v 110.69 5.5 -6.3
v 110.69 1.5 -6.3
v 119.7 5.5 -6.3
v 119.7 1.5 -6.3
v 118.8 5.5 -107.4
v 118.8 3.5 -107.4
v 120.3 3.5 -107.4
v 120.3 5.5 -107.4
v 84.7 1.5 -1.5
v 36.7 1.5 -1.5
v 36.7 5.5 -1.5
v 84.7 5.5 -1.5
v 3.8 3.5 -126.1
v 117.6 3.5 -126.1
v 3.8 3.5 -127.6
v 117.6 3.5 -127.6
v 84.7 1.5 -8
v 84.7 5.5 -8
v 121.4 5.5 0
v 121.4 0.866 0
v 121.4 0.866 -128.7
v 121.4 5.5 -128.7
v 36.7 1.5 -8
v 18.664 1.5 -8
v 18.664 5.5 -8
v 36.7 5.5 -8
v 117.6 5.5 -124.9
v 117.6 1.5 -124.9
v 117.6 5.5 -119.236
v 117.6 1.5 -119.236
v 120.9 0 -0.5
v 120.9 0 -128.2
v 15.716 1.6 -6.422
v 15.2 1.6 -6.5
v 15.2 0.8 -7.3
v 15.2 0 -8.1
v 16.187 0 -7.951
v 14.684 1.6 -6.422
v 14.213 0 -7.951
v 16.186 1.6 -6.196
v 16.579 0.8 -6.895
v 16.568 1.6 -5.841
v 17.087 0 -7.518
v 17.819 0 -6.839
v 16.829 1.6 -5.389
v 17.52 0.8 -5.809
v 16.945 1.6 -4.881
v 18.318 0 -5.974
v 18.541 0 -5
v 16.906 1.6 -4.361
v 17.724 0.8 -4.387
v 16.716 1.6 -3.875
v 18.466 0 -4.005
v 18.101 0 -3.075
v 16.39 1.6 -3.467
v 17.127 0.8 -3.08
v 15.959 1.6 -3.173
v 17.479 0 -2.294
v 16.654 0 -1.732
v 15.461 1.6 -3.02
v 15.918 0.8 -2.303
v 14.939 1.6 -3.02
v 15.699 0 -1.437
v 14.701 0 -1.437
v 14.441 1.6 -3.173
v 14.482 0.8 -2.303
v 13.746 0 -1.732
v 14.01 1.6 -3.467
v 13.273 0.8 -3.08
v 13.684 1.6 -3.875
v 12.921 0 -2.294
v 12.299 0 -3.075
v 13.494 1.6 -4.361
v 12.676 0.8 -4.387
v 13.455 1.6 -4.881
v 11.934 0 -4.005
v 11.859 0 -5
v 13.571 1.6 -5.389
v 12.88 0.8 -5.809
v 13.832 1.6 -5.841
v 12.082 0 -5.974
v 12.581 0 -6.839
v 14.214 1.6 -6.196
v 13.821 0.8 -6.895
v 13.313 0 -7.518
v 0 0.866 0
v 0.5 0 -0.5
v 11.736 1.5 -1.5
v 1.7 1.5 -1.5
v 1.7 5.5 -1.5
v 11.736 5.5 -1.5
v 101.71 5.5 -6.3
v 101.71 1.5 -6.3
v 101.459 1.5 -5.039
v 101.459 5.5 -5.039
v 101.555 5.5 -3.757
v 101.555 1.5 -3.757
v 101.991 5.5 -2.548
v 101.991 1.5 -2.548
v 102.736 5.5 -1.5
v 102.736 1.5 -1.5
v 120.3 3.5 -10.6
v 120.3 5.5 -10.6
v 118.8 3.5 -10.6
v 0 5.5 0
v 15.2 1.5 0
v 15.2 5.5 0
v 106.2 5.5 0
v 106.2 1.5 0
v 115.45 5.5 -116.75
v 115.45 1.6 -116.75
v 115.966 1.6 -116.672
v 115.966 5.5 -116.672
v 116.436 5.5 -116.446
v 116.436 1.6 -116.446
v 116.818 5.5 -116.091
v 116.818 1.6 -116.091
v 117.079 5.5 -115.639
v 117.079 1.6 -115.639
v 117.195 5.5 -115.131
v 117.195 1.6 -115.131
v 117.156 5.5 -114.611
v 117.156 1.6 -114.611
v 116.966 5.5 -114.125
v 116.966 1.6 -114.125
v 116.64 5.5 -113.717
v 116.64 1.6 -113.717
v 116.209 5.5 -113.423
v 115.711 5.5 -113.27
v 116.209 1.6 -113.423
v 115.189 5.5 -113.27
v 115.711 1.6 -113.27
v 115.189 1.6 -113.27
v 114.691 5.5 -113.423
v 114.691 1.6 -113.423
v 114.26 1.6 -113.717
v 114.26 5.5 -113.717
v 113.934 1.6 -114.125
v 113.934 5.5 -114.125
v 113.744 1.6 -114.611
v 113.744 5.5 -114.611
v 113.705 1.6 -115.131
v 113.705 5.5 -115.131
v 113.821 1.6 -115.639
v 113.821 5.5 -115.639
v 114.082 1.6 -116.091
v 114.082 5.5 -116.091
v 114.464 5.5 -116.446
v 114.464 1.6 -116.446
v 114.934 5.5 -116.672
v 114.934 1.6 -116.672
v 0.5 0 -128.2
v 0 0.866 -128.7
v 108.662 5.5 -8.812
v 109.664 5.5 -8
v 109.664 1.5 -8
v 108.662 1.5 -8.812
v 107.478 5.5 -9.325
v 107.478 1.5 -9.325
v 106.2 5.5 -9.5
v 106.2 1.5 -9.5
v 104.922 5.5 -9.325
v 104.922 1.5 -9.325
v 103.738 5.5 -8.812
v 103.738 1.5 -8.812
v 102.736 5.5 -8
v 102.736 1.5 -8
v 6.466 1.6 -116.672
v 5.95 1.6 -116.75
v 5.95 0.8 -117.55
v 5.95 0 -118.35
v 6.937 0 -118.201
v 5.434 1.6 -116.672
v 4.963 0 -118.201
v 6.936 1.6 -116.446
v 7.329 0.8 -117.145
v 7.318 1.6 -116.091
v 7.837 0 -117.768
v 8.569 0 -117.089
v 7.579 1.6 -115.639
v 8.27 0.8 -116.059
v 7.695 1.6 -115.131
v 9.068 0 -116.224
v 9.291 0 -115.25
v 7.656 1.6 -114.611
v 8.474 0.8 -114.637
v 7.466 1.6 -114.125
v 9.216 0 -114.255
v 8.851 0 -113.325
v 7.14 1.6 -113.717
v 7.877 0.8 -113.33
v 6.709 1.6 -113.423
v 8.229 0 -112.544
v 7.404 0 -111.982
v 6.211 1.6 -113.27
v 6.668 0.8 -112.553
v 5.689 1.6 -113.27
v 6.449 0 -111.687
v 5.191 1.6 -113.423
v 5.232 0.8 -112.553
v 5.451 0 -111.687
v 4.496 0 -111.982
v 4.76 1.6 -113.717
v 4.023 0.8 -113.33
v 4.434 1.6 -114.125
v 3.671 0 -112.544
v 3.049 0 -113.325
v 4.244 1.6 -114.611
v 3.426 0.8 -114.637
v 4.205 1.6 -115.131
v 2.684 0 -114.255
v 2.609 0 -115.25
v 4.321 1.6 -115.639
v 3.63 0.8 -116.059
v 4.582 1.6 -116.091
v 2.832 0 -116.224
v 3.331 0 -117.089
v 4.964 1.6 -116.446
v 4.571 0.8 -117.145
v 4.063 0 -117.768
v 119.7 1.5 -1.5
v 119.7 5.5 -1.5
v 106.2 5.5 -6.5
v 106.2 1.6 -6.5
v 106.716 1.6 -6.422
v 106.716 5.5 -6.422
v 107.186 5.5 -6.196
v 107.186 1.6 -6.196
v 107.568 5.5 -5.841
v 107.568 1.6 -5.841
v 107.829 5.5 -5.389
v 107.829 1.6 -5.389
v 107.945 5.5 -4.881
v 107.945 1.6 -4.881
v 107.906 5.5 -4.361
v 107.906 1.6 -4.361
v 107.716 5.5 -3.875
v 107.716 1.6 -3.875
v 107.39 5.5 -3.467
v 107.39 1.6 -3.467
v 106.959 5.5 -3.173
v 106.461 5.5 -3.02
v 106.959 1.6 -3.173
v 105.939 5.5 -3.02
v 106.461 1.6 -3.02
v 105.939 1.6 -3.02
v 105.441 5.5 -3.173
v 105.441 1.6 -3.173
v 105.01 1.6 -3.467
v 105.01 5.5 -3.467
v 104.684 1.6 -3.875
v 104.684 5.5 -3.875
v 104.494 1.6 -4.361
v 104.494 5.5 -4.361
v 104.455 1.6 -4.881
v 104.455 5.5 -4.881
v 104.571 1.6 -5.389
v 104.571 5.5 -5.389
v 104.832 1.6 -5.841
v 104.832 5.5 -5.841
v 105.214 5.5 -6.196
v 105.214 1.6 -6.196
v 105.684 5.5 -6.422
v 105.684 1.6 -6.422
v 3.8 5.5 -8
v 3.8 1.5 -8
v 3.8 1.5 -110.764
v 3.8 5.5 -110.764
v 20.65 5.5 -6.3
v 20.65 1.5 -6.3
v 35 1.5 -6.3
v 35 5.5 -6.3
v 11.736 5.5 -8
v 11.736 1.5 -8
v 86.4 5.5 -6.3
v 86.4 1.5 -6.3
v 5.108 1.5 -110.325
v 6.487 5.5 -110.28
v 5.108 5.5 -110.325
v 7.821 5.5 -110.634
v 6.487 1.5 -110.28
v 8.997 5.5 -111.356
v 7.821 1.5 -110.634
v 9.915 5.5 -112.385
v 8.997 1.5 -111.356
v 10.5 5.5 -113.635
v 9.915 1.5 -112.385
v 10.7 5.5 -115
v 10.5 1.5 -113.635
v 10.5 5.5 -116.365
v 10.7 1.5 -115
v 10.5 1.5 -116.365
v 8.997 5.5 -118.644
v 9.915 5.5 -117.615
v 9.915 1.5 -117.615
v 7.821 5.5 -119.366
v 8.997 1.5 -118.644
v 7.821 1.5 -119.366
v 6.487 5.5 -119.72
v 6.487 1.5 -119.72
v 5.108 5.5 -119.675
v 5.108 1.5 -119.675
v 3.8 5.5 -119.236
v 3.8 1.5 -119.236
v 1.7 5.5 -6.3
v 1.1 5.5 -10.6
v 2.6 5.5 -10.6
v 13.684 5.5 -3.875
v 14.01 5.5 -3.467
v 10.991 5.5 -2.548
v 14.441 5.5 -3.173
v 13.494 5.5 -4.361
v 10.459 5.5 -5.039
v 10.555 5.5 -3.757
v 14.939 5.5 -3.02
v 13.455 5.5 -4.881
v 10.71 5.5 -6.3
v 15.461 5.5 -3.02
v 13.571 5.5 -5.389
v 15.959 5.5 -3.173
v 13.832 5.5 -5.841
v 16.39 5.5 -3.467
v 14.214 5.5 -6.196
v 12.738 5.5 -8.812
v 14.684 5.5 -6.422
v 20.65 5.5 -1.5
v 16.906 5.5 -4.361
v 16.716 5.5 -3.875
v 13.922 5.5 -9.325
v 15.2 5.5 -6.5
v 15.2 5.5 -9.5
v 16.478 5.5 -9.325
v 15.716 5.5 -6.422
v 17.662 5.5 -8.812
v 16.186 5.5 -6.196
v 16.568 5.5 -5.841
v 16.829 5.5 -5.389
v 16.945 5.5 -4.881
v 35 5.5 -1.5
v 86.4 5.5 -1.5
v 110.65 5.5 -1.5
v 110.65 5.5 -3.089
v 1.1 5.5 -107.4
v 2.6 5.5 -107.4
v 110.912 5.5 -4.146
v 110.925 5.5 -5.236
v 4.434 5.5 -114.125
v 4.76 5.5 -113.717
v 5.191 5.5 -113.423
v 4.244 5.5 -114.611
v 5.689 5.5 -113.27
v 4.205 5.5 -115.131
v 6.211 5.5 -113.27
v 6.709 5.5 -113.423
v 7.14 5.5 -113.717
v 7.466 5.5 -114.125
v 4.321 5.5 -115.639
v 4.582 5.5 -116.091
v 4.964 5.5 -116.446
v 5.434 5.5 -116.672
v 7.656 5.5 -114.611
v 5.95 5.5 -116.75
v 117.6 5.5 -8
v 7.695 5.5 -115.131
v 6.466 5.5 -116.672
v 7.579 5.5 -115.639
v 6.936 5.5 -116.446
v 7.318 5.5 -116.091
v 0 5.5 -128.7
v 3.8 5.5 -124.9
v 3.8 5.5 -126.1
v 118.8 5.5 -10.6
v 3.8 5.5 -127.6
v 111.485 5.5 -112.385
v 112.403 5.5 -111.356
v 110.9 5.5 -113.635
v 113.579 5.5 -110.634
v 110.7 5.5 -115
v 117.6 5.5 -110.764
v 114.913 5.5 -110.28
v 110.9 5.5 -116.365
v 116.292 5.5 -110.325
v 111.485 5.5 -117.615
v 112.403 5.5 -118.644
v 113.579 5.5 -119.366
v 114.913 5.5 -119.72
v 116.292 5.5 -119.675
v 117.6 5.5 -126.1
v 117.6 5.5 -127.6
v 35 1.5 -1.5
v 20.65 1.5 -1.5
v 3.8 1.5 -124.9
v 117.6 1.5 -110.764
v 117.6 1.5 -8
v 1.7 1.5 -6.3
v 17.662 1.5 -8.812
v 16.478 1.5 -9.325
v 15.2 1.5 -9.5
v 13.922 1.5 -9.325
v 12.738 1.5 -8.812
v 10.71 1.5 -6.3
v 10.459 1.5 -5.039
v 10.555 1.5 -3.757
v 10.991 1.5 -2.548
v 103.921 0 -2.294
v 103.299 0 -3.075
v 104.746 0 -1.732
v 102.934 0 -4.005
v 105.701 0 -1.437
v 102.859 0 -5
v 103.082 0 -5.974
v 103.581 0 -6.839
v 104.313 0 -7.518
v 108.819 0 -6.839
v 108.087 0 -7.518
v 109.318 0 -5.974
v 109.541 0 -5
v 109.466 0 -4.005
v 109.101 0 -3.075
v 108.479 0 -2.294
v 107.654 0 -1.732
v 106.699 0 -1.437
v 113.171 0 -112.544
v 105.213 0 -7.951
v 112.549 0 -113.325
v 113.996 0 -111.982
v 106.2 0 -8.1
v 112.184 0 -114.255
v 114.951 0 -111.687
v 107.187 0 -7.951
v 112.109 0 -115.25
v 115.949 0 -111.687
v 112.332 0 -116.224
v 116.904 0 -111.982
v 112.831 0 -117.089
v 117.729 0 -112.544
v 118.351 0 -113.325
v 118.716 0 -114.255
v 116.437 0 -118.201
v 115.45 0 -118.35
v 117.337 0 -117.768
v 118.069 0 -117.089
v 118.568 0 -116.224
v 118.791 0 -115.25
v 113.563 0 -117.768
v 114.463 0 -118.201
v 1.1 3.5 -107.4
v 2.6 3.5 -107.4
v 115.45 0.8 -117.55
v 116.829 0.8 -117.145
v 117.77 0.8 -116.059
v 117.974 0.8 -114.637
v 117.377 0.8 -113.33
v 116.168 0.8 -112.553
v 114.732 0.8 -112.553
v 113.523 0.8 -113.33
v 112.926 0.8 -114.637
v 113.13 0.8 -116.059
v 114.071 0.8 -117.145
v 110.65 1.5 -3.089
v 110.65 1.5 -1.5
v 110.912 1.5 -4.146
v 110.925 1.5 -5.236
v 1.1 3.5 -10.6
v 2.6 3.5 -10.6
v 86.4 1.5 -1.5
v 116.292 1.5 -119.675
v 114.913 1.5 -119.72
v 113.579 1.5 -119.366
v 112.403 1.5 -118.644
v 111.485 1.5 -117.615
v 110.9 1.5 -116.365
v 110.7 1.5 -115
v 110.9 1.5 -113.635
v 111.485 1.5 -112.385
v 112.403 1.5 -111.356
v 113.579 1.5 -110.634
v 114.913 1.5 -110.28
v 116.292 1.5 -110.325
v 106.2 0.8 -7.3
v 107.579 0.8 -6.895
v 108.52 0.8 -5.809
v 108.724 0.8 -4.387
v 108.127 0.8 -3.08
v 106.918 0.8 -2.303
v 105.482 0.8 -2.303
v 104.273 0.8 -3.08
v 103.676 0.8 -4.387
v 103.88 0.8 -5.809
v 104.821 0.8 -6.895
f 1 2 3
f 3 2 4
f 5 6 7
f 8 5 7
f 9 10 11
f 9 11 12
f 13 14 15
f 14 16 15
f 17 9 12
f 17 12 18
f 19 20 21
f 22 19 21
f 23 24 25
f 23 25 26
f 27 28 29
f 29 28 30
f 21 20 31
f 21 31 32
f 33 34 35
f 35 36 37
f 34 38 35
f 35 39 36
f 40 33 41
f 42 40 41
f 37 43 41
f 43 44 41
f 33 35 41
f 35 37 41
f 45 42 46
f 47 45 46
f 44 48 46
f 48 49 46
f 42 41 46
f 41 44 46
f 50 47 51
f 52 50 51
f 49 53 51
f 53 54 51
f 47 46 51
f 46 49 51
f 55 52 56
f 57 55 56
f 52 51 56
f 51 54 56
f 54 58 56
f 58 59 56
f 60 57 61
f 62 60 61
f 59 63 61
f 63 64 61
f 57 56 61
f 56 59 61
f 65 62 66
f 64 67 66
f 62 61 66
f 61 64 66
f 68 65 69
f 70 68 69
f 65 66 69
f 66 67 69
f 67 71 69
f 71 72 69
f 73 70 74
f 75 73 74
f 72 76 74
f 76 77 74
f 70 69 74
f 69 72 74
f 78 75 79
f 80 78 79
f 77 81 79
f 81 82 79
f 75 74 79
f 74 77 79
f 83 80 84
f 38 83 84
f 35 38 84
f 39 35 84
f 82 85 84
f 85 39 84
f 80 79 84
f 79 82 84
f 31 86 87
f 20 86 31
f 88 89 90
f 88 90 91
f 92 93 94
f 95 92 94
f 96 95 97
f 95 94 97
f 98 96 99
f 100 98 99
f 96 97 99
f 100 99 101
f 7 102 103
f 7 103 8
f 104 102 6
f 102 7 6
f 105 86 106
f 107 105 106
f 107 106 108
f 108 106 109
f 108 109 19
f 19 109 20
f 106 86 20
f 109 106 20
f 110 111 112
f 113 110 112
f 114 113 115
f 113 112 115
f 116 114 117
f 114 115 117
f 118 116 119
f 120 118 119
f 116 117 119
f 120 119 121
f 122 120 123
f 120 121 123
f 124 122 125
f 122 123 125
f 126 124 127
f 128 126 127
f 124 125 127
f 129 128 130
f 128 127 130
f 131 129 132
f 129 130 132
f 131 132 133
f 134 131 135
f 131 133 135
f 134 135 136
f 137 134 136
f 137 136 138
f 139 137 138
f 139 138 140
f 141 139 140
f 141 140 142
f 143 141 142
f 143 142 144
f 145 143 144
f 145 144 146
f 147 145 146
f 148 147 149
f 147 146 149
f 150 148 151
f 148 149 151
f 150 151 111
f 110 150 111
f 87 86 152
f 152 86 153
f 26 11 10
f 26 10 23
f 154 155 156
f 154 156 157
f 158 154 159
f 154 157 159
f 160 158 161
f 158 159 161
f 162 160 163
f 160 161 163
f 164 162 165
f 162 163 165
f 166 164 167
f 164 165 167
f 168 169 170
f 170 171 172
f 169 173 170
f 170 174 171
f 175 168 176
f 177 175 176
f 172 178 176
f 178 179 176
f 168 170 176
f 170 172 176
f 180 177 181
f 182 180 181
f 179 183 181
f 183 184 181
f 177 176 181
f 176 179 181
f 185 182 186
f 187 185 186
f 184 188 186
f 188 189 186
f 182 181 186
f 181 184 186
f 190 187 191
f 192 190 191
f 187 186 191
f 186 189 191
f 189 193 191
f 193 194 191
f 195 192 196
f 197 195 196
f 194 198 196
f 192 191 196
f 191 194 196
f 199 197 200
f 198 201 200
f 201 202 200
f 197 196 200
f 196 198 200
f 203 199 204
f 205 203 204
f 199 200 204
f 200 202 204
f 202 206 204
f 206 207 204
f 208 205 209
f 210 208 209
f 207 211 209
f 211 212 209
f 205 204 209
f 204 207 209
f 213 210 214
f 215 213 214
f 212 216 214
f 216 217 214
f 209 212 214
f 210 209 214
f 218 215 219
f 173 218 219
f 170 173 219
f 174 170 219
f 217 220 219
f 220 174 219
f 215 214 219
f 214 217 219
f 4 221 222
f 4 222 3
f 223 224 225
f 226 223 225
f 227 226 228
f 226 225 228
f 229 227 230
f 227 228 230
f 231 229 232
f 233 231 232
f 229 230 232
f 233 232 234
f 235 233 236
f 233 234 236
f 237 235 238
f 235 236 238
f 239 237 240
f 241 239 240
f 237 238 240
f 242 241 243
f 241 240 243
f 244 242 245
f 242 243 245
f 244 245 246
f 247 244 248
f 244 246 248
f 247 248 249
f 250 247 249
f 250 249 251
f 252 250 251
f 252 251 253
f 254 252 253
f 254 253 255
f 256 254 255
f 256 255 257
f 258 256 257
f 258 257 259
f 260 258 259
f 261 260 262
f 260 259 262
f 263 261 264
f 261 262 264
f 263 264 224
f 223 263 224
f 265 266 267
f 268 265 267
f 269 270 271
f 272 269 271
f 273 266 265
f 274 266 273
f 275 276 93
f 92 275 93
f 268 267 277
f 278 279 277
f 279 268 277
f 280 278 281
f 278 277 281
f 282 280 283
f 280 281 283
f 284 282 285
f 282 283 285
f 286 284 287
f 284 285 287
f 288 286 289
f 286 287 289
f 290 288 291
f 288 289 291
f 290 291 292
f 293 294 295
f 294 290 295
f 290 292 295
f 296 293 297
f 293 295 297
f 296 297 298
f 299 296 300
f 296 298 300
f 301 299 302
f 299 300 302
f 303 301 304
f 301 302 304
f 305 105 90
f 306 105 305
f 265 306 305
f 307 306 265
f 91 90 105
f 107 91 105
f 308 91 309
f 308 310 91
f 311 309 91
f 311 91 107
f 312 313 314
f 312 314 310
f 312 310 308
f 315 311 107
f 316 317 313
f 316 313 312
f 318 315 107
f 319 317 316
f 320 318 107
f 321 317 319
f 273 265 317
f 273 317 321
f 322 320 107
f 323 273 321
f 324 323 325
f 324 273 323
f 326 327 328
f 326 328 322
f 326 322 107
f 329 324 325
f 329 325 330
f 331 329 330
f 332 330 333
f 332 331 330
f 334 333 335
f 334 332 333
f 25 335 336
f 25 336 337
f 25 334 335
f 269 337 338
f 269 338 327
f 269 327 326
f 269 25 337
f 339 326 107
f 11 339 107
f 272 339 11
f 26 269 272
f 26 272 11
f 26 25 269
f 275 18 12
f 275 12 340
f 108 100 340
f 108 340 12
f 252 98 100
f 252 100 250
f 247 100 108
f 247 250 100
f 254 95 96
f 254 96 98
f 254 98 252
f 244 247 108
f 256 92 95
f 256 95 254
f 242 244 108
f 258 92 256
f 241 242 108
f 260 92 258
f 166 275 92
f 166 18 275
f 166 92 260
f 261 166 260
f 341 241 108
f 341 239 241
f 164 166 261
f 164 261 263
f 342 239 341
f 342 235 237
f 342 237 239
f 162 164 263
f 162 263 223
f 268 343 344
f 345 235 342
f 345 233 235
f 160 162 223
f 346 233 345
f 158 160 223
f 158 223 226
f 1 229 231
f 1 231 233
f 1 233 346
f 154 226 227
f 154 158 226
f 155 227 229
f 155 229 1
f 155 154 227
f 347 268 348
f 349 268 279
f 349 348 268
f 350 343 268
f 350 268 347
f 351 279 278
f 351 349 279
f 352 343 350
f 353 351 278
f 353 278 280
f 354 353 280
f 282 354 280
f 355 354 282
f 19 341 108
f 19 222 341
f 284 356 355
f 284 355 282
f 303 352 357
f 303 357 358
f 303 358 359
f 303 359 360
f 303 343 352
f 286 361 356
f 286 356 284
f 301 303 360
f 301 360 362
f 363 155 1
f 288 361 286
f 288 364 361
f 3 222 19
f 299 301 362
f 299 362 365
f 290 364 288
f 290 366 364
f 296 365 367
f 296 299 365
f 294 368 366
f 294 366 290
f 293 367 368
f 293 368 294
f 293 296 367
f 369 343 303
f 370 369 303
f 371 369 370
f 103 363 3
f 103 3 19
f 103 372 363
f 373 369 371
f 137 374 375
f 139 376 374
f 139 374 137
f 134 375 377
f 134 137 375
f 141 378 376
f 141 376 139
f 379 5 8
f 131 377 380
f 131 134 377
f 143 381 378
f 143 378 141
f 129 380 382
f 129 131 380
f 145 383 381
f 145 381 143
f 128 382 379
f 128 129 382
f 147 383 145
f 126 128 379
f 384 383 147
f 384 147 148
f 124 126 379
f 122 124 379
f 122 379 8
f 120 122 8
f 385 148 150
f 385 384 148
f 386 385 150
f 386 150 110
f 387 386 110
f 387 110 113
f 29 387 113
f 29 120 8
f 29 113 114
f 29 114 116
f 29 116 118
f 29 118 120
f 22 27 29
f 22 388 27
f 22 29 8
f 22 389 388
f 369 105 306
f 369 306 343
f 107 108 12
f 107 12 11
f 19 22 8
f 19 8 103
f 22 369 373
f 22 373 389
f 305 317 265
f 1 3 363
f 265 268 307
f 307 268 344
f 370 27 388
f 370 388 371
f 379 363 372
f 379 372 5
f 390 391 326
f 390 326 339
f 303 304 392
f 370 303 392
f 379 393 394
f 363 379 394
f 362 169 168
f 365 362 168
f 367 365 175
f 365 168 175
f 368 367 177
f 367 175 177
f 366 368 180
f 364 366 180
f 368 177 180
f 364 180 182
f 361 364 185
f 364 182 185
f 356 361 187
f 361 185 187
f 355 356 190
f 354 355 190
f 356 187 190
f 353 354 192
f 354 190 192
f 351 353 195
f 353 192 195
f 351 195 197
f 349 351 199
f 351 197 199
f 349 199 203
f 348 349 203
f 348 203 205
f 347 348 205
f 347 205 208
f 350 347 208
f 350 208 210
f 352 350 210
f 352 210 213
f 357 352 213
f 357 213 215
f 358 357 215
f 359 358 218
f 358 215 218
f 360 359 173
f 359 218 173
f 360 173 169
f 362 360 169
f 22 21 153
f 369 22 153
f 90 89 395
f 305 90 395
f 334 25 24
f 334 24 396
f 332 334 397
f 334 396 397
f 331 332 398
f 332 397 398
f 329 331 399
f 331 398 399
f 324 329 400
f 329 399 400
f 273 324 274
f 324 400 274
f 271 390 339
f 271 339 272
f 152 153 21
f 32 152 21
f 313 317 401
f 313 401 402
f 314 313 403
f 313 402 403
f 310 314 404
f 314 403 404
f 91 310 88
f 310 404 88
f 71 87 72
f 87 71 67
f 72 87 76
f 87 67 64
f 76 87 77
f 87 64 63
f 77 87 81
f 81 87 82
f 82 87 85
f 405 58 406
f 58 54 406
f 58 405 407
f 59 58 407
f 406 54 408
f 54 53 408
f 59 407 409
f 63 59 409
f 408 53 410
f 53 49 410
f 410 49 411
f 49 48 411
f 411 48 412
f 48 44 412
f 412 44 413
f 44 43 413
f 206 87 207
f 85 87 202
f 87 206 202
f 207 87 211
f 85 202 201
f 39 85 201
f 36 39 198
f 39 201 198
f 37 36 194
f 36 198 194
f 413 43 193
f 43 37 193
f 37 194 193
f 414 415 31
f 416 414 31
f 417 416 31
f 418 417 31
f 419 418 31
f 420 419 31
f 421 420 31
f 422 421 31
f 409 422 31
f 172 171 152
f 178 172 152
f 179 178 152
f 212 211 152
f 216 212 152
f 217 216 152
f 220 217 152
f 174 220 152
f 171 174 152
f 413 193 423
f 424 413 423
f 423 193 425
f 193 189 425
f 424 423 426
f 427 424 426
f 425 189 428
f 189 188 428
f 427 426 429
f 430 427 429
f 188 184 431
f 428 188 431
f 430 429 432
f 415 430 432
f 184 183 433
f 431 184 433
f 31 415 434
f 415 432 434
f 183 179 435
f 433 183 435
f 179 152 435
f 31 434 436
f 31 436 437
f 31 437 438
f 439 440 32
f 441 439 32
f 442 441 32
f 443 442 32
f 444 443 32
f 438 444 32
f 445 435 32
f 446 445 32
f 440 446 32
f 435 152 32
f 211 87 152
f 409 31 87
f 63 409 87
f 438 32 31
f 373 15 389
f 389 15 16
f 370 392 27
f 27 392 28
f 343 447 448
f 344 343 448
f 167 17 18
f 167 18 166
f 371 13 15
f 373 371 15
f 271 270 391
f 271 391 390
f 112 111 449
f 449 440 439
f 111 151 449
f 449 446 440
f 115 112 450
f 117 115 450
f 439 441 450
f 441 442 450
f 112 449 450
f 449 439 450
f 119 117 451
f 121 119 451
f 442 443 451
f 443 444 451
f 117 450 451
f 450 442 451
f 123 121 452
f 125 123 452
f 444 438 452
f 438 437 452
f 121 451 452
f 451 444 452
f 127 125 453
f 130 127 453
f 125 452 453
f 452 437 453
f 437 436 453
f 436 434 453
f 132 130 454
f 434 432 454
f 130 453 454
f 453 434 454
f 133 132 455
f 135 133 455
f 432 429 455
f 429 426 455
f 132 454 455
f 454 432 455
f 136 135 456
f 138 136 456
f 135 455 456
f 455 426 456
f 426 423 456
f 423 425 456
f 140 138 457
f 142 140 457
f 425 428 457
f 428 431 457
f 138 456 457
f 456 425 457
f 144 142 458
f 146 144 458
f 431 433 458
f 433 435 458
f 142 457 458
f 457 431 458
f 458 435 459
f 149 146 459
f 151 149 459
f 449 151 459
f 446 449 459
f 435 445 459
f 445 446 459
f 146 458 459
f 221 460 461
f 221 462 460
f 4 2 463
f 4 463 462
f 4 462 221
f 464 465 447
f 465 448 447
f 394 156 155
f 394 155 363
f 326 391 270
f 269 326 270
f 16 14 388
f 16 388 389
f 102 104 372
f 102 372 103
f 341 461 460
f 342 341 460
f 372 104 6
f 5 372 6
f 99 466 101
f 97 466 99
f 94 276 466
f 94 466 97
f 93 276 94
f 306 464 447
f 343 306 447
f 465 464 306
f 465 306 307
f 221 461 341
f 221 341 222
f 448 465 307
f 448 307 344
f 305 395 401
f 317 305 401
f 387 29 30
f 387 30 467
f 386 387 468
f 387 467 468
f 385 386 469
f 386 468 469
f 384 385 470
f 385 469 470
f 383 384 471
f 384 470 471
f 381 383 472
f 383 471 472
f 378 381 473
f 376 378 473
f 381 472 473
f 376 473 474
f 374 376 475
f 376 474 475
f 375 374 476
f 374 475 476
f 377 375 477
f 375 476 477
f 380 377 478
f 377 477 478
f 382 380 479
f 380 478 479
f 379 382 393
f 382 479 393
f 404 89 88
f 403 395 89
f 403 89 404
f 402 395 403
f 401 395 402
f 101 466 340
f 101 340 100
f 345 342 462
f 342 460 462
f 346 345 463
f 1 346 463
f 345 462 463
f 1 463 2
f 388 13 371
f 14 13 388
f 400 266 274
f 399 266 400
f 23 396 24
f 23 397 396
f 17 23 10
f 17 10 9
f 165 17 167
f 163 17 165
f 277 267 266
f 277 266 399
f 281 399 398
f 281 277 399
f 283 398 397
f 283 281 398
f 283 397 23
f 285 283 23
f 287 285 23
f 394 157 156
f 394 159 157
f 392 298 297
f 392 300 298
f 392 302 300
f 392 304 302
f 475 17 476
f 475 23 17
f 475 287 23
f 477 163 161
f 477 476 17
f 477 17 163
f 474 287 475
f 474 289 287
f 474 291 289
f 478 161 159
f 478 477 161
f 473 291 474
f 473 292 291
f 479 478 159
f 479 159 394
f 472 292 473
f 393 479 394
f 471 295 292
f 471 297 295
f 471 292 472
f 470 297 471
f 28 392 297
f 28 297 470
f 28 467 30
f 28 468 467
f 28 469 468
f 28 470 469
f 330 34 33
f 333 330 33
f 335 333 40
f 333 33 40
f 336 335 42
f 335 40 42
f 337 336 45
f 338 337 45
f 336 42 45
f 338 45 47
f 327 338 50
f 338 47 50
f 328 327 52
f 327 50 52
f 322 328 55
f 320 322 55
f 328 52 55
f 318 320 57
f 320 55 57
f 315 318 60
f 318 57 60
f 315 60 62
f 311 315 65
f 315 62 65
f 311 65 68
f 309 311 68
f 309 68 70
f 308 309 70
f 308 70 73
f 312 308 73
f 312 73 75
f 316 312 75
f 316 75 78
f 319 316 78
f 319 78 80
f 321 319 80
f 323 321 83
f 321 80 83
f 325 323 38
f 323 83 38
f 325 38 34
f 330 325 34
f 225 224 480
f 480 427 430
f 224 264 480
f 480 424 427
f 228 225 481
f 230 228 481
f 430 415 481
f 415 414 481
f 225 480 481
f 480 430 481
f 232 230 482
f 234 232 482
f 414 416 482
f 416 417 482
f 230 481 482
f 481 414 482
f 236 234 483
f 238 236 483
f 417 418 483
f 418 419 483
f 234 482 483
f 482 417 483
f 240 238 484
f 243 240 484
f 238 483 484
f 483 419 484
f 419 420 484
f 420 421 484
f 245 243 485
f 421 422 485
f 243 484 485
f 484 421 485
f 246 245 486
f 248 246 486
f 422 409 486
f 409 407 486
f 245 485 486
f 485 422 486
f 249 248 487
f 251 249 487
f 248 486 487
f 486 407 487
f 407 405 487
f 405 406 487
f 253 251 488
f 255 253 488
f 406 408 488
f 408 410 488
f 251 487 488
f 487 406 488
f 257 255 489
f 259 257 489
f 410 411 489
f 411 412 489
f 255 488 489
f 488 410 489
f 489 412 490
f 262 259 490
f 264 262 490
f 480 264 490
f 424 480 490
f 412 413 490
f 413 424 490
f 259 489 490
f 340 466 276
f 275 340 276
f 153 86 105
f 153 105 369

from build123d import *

# Parameters (mm, degrees)
SKETCH_1_W          = 121.4
SKETCH_1_H          = 128.7
EXTRUDE_1_DEPTH     = 1.5
EXTRUDE_2_DEPTH     = 2
SKETCH_3_W          = 1.5
SKETCH_3_H          = 96.8
SKETCH_3_W_2        = 113.8
SKETCH_3_H_2        = 1.5
EXTRUDE_3_DEPTH     = 2
SKETCH_5_W          = 121.4
SKETCH_5_H          = 8
SKETCH_5_W_2        = 12.45
SKETCH_5_H_2        = 4.8
SKETCH_5_W_3        = 9.05
SKETCH_5_W_4        = 17.75
SKETCH_5_W_5        = 14.35
SKETCH_5_W_6        = 48
EXTRUDE_5_DEPTH     = 4
SKETCH_7_R          = 4.75
EXTRUDE_10_DEPTH    = 4
SKETCH_8_R          = 1.75
CUT_EXTRUDE_3_DEPTH = 5.5
CHAMFER_1_SIZE      = 1.6
SKETCH_10_W         = 48
SKETCH_10_H         = 6.5
CUT_EXTRUDE_4_DEPTH = 4
CHAMFER_2_SIZE      = 0.5
CHAMFER_2_SIZE2     = 0.866025404


with BuildPart() as part:
    # Эскиз1 → Бобышка-Вытянуть1 (new body)
    with BuildSketch(Plane(origin=(0, 0, 0), x_dir=(1, 0, 0), z_dir=(0, 1, 0))):
        with Locations((60.7, 64.35)):
            Rectangle(SKETCH_1_W, SKETCH_1_H)
    extrude(amount=EXTRUDE_1_DEPTH)

    # Эскиз2 → Бобышка-Вытянуть2 (add)
    with BuildSketch(Plane(origin=(0, 1.5, 0), x_dir=(1, 0, 0), z_dir=(0, 1, 0))):
        Polygon((0, 8), (0, 128.7), (121.4, 128.7), (121.4, 8), (117.6, 8), (117.6, 124.9), (3.8, 124.9), (3.8, 8), align=None)
    extrude(amount=EXTRUDE_2_DEPTH)

    # Эскиз3 → Бобышка-Вытянуть3 (add)
    with BuildSketch(Plane(origin=(0, 3.5, 0), x_dir=(1, 0, 0), z_dir=(0, 1, 0))):
        Polygon((0, 8), (3.8, 8), (3.8, 124.9), (117.6, 124.9), (117.6, 8), (121.4, 8), (121.4, 128.7), (0, 128.7), align=None)
        with Locations((1.85, 59)):
            Rectangle(SKETCH_3_W, SKETCH_3_H, mode=Mode.SUBTRACT)
        with Locations((60.7, 126.85)):
            Rectangle(SKETCH_3_W_2, SKETCH_3_H_2, mode=Mode.SUBTRACT)
        with Locations((119.55, 59)):
            Rectangle(SKETCH_3_W, SKETCH_3_H, mode=Mode.SUBTRACT)
    extrude(amount=EXTRUDE_3_DEPTH)

    # Эскиз5 → Бобышка-Вытянуть5 (add)
    with BuildSketch(Plane(origin=(0, 1.5, 0), x_dir=(1, 0, 0), z_dir=(0, 1, 0))):
        with Locations((60.7, 4)):
            Rectangle(SKETCH_5_W, SKETCH_5_H)
        with Locations((7.925, 3.9)):
            Rectangle(SKETCH_5_W_2, SKETCH_5_H_2, mode=Mode.SUBTRACT)
        with Locations((115.175, 3.9)):
            Rectangle(SKETCH_5_W_3, SKETCH_5_H_2, mode=Mode.SUBTRACT)
        with Locations((95.275, 3.9)):
            Rectangle(SKETCH_5_W_4, SKETCH_5_H_2, mode=Mode.SUBTRACT)
        with Locations((27.825, 3.9)):
            Rectangle(SKETCH_5_W_5, SKETCH_5_H_2, mode=Mode.SUBTRACT)
        with Locations((60.7, 3.9)):
            Rectangle(SKETCH_5_W_6, SKETCH_5_H_2, mode=Mode.SUBTRACT)
    extrude(amount=EXTRUDE_5_DEPTH)

    # Эскиз7 → Бобышка-Вытянуть10 (add)
    with BuildSketch(Plane(origin=(0, 1.5, 0), x_dir=(1, 0, 0), z_dir=(0, 1, 0))):
        with Locations((5.95, 115)):
            Circle(SKETCH_7_R)
        with Locations((115.45, 115)):
            Circle(SKETCH_7_R)
        with Locations((15.2, 4.75)):
            Circle(SKETCH_7_R)
        with Locations((106.2, 4.75)):
            Circle(SKETCH_7_R)
    extrude(amount=EXTRUDE_10_DEPTH)

    # Эскиз8 → Вырез-Вытянуть3 (cut)
    with BuildSketch(Plane.XZ):
        with Locations(Location((15.2, -4.75, 0), (0, 0, 270))):
            Circle(SKETCH_8_R)
        with Locations(Location((106.2, -4.75, 0), (0, 0, 270))):
            Circle(SKETCH_8_R)
        with Locations(Location((5.95, -115, 0), (0, 0, 270))):
            Circle(SKETCH_8_R)
        with Locations(Location((115.45, -115, 0), (0, 0, 270))):
            Circle(SKETCH_8_R)
    extrude(amount=-CUT_EXTRUDE_3_DEPTH, mode=Mode.SUBTRACT)

    # Фаска1
    chamfer_1_edges = [part.edges().sort_by_distance(p)[0] for p in [
        (115.45, 0, -113.25),
        (5.95, 0, -113.25),
        (106.2, 0, -3),
        (15.2, 0, -3),
    ]]
    chamfer(chamfer_1_edges, length=CHAMFER_1_SIZE)

    # Эскиз10 → Вырез-Вытянуть4 (cut)
    with BuildSketch(Plane(origin=(0, 5.5, 0), x_dir=(1, 0, 0), z_dir=(0, 1, 0))):
        with Locations((60.7, 4.75)):
            Rectangle(SKETCH_10_W, SKETCH_10_H)
    extrude(amount=-CUT_EXTRUDE_4_DEPTH, mode=Mode.SUBTRACT)

    # Фаска2
    chamfer_2_edges = [part.edges().sort_by_distance(p)[0] for p in [
        (0, 0, -64.35),
        (60.7, 0, -128.7),
        (121.4, 0, -64.35),
        (60.7, 0, 0),
    ]]
    chamfer_2_side = [part.faces().sort_by_distance(p)[0] for p in [
        (60.7, 0, -64.390759898),
    ]]
    chamfer(chamfer_2_edges, length=CHAMFER_2_SIZE, length2=CHAMFER_2_SIZE2, reference=chamfer_2_side[0])


solid = part.part
